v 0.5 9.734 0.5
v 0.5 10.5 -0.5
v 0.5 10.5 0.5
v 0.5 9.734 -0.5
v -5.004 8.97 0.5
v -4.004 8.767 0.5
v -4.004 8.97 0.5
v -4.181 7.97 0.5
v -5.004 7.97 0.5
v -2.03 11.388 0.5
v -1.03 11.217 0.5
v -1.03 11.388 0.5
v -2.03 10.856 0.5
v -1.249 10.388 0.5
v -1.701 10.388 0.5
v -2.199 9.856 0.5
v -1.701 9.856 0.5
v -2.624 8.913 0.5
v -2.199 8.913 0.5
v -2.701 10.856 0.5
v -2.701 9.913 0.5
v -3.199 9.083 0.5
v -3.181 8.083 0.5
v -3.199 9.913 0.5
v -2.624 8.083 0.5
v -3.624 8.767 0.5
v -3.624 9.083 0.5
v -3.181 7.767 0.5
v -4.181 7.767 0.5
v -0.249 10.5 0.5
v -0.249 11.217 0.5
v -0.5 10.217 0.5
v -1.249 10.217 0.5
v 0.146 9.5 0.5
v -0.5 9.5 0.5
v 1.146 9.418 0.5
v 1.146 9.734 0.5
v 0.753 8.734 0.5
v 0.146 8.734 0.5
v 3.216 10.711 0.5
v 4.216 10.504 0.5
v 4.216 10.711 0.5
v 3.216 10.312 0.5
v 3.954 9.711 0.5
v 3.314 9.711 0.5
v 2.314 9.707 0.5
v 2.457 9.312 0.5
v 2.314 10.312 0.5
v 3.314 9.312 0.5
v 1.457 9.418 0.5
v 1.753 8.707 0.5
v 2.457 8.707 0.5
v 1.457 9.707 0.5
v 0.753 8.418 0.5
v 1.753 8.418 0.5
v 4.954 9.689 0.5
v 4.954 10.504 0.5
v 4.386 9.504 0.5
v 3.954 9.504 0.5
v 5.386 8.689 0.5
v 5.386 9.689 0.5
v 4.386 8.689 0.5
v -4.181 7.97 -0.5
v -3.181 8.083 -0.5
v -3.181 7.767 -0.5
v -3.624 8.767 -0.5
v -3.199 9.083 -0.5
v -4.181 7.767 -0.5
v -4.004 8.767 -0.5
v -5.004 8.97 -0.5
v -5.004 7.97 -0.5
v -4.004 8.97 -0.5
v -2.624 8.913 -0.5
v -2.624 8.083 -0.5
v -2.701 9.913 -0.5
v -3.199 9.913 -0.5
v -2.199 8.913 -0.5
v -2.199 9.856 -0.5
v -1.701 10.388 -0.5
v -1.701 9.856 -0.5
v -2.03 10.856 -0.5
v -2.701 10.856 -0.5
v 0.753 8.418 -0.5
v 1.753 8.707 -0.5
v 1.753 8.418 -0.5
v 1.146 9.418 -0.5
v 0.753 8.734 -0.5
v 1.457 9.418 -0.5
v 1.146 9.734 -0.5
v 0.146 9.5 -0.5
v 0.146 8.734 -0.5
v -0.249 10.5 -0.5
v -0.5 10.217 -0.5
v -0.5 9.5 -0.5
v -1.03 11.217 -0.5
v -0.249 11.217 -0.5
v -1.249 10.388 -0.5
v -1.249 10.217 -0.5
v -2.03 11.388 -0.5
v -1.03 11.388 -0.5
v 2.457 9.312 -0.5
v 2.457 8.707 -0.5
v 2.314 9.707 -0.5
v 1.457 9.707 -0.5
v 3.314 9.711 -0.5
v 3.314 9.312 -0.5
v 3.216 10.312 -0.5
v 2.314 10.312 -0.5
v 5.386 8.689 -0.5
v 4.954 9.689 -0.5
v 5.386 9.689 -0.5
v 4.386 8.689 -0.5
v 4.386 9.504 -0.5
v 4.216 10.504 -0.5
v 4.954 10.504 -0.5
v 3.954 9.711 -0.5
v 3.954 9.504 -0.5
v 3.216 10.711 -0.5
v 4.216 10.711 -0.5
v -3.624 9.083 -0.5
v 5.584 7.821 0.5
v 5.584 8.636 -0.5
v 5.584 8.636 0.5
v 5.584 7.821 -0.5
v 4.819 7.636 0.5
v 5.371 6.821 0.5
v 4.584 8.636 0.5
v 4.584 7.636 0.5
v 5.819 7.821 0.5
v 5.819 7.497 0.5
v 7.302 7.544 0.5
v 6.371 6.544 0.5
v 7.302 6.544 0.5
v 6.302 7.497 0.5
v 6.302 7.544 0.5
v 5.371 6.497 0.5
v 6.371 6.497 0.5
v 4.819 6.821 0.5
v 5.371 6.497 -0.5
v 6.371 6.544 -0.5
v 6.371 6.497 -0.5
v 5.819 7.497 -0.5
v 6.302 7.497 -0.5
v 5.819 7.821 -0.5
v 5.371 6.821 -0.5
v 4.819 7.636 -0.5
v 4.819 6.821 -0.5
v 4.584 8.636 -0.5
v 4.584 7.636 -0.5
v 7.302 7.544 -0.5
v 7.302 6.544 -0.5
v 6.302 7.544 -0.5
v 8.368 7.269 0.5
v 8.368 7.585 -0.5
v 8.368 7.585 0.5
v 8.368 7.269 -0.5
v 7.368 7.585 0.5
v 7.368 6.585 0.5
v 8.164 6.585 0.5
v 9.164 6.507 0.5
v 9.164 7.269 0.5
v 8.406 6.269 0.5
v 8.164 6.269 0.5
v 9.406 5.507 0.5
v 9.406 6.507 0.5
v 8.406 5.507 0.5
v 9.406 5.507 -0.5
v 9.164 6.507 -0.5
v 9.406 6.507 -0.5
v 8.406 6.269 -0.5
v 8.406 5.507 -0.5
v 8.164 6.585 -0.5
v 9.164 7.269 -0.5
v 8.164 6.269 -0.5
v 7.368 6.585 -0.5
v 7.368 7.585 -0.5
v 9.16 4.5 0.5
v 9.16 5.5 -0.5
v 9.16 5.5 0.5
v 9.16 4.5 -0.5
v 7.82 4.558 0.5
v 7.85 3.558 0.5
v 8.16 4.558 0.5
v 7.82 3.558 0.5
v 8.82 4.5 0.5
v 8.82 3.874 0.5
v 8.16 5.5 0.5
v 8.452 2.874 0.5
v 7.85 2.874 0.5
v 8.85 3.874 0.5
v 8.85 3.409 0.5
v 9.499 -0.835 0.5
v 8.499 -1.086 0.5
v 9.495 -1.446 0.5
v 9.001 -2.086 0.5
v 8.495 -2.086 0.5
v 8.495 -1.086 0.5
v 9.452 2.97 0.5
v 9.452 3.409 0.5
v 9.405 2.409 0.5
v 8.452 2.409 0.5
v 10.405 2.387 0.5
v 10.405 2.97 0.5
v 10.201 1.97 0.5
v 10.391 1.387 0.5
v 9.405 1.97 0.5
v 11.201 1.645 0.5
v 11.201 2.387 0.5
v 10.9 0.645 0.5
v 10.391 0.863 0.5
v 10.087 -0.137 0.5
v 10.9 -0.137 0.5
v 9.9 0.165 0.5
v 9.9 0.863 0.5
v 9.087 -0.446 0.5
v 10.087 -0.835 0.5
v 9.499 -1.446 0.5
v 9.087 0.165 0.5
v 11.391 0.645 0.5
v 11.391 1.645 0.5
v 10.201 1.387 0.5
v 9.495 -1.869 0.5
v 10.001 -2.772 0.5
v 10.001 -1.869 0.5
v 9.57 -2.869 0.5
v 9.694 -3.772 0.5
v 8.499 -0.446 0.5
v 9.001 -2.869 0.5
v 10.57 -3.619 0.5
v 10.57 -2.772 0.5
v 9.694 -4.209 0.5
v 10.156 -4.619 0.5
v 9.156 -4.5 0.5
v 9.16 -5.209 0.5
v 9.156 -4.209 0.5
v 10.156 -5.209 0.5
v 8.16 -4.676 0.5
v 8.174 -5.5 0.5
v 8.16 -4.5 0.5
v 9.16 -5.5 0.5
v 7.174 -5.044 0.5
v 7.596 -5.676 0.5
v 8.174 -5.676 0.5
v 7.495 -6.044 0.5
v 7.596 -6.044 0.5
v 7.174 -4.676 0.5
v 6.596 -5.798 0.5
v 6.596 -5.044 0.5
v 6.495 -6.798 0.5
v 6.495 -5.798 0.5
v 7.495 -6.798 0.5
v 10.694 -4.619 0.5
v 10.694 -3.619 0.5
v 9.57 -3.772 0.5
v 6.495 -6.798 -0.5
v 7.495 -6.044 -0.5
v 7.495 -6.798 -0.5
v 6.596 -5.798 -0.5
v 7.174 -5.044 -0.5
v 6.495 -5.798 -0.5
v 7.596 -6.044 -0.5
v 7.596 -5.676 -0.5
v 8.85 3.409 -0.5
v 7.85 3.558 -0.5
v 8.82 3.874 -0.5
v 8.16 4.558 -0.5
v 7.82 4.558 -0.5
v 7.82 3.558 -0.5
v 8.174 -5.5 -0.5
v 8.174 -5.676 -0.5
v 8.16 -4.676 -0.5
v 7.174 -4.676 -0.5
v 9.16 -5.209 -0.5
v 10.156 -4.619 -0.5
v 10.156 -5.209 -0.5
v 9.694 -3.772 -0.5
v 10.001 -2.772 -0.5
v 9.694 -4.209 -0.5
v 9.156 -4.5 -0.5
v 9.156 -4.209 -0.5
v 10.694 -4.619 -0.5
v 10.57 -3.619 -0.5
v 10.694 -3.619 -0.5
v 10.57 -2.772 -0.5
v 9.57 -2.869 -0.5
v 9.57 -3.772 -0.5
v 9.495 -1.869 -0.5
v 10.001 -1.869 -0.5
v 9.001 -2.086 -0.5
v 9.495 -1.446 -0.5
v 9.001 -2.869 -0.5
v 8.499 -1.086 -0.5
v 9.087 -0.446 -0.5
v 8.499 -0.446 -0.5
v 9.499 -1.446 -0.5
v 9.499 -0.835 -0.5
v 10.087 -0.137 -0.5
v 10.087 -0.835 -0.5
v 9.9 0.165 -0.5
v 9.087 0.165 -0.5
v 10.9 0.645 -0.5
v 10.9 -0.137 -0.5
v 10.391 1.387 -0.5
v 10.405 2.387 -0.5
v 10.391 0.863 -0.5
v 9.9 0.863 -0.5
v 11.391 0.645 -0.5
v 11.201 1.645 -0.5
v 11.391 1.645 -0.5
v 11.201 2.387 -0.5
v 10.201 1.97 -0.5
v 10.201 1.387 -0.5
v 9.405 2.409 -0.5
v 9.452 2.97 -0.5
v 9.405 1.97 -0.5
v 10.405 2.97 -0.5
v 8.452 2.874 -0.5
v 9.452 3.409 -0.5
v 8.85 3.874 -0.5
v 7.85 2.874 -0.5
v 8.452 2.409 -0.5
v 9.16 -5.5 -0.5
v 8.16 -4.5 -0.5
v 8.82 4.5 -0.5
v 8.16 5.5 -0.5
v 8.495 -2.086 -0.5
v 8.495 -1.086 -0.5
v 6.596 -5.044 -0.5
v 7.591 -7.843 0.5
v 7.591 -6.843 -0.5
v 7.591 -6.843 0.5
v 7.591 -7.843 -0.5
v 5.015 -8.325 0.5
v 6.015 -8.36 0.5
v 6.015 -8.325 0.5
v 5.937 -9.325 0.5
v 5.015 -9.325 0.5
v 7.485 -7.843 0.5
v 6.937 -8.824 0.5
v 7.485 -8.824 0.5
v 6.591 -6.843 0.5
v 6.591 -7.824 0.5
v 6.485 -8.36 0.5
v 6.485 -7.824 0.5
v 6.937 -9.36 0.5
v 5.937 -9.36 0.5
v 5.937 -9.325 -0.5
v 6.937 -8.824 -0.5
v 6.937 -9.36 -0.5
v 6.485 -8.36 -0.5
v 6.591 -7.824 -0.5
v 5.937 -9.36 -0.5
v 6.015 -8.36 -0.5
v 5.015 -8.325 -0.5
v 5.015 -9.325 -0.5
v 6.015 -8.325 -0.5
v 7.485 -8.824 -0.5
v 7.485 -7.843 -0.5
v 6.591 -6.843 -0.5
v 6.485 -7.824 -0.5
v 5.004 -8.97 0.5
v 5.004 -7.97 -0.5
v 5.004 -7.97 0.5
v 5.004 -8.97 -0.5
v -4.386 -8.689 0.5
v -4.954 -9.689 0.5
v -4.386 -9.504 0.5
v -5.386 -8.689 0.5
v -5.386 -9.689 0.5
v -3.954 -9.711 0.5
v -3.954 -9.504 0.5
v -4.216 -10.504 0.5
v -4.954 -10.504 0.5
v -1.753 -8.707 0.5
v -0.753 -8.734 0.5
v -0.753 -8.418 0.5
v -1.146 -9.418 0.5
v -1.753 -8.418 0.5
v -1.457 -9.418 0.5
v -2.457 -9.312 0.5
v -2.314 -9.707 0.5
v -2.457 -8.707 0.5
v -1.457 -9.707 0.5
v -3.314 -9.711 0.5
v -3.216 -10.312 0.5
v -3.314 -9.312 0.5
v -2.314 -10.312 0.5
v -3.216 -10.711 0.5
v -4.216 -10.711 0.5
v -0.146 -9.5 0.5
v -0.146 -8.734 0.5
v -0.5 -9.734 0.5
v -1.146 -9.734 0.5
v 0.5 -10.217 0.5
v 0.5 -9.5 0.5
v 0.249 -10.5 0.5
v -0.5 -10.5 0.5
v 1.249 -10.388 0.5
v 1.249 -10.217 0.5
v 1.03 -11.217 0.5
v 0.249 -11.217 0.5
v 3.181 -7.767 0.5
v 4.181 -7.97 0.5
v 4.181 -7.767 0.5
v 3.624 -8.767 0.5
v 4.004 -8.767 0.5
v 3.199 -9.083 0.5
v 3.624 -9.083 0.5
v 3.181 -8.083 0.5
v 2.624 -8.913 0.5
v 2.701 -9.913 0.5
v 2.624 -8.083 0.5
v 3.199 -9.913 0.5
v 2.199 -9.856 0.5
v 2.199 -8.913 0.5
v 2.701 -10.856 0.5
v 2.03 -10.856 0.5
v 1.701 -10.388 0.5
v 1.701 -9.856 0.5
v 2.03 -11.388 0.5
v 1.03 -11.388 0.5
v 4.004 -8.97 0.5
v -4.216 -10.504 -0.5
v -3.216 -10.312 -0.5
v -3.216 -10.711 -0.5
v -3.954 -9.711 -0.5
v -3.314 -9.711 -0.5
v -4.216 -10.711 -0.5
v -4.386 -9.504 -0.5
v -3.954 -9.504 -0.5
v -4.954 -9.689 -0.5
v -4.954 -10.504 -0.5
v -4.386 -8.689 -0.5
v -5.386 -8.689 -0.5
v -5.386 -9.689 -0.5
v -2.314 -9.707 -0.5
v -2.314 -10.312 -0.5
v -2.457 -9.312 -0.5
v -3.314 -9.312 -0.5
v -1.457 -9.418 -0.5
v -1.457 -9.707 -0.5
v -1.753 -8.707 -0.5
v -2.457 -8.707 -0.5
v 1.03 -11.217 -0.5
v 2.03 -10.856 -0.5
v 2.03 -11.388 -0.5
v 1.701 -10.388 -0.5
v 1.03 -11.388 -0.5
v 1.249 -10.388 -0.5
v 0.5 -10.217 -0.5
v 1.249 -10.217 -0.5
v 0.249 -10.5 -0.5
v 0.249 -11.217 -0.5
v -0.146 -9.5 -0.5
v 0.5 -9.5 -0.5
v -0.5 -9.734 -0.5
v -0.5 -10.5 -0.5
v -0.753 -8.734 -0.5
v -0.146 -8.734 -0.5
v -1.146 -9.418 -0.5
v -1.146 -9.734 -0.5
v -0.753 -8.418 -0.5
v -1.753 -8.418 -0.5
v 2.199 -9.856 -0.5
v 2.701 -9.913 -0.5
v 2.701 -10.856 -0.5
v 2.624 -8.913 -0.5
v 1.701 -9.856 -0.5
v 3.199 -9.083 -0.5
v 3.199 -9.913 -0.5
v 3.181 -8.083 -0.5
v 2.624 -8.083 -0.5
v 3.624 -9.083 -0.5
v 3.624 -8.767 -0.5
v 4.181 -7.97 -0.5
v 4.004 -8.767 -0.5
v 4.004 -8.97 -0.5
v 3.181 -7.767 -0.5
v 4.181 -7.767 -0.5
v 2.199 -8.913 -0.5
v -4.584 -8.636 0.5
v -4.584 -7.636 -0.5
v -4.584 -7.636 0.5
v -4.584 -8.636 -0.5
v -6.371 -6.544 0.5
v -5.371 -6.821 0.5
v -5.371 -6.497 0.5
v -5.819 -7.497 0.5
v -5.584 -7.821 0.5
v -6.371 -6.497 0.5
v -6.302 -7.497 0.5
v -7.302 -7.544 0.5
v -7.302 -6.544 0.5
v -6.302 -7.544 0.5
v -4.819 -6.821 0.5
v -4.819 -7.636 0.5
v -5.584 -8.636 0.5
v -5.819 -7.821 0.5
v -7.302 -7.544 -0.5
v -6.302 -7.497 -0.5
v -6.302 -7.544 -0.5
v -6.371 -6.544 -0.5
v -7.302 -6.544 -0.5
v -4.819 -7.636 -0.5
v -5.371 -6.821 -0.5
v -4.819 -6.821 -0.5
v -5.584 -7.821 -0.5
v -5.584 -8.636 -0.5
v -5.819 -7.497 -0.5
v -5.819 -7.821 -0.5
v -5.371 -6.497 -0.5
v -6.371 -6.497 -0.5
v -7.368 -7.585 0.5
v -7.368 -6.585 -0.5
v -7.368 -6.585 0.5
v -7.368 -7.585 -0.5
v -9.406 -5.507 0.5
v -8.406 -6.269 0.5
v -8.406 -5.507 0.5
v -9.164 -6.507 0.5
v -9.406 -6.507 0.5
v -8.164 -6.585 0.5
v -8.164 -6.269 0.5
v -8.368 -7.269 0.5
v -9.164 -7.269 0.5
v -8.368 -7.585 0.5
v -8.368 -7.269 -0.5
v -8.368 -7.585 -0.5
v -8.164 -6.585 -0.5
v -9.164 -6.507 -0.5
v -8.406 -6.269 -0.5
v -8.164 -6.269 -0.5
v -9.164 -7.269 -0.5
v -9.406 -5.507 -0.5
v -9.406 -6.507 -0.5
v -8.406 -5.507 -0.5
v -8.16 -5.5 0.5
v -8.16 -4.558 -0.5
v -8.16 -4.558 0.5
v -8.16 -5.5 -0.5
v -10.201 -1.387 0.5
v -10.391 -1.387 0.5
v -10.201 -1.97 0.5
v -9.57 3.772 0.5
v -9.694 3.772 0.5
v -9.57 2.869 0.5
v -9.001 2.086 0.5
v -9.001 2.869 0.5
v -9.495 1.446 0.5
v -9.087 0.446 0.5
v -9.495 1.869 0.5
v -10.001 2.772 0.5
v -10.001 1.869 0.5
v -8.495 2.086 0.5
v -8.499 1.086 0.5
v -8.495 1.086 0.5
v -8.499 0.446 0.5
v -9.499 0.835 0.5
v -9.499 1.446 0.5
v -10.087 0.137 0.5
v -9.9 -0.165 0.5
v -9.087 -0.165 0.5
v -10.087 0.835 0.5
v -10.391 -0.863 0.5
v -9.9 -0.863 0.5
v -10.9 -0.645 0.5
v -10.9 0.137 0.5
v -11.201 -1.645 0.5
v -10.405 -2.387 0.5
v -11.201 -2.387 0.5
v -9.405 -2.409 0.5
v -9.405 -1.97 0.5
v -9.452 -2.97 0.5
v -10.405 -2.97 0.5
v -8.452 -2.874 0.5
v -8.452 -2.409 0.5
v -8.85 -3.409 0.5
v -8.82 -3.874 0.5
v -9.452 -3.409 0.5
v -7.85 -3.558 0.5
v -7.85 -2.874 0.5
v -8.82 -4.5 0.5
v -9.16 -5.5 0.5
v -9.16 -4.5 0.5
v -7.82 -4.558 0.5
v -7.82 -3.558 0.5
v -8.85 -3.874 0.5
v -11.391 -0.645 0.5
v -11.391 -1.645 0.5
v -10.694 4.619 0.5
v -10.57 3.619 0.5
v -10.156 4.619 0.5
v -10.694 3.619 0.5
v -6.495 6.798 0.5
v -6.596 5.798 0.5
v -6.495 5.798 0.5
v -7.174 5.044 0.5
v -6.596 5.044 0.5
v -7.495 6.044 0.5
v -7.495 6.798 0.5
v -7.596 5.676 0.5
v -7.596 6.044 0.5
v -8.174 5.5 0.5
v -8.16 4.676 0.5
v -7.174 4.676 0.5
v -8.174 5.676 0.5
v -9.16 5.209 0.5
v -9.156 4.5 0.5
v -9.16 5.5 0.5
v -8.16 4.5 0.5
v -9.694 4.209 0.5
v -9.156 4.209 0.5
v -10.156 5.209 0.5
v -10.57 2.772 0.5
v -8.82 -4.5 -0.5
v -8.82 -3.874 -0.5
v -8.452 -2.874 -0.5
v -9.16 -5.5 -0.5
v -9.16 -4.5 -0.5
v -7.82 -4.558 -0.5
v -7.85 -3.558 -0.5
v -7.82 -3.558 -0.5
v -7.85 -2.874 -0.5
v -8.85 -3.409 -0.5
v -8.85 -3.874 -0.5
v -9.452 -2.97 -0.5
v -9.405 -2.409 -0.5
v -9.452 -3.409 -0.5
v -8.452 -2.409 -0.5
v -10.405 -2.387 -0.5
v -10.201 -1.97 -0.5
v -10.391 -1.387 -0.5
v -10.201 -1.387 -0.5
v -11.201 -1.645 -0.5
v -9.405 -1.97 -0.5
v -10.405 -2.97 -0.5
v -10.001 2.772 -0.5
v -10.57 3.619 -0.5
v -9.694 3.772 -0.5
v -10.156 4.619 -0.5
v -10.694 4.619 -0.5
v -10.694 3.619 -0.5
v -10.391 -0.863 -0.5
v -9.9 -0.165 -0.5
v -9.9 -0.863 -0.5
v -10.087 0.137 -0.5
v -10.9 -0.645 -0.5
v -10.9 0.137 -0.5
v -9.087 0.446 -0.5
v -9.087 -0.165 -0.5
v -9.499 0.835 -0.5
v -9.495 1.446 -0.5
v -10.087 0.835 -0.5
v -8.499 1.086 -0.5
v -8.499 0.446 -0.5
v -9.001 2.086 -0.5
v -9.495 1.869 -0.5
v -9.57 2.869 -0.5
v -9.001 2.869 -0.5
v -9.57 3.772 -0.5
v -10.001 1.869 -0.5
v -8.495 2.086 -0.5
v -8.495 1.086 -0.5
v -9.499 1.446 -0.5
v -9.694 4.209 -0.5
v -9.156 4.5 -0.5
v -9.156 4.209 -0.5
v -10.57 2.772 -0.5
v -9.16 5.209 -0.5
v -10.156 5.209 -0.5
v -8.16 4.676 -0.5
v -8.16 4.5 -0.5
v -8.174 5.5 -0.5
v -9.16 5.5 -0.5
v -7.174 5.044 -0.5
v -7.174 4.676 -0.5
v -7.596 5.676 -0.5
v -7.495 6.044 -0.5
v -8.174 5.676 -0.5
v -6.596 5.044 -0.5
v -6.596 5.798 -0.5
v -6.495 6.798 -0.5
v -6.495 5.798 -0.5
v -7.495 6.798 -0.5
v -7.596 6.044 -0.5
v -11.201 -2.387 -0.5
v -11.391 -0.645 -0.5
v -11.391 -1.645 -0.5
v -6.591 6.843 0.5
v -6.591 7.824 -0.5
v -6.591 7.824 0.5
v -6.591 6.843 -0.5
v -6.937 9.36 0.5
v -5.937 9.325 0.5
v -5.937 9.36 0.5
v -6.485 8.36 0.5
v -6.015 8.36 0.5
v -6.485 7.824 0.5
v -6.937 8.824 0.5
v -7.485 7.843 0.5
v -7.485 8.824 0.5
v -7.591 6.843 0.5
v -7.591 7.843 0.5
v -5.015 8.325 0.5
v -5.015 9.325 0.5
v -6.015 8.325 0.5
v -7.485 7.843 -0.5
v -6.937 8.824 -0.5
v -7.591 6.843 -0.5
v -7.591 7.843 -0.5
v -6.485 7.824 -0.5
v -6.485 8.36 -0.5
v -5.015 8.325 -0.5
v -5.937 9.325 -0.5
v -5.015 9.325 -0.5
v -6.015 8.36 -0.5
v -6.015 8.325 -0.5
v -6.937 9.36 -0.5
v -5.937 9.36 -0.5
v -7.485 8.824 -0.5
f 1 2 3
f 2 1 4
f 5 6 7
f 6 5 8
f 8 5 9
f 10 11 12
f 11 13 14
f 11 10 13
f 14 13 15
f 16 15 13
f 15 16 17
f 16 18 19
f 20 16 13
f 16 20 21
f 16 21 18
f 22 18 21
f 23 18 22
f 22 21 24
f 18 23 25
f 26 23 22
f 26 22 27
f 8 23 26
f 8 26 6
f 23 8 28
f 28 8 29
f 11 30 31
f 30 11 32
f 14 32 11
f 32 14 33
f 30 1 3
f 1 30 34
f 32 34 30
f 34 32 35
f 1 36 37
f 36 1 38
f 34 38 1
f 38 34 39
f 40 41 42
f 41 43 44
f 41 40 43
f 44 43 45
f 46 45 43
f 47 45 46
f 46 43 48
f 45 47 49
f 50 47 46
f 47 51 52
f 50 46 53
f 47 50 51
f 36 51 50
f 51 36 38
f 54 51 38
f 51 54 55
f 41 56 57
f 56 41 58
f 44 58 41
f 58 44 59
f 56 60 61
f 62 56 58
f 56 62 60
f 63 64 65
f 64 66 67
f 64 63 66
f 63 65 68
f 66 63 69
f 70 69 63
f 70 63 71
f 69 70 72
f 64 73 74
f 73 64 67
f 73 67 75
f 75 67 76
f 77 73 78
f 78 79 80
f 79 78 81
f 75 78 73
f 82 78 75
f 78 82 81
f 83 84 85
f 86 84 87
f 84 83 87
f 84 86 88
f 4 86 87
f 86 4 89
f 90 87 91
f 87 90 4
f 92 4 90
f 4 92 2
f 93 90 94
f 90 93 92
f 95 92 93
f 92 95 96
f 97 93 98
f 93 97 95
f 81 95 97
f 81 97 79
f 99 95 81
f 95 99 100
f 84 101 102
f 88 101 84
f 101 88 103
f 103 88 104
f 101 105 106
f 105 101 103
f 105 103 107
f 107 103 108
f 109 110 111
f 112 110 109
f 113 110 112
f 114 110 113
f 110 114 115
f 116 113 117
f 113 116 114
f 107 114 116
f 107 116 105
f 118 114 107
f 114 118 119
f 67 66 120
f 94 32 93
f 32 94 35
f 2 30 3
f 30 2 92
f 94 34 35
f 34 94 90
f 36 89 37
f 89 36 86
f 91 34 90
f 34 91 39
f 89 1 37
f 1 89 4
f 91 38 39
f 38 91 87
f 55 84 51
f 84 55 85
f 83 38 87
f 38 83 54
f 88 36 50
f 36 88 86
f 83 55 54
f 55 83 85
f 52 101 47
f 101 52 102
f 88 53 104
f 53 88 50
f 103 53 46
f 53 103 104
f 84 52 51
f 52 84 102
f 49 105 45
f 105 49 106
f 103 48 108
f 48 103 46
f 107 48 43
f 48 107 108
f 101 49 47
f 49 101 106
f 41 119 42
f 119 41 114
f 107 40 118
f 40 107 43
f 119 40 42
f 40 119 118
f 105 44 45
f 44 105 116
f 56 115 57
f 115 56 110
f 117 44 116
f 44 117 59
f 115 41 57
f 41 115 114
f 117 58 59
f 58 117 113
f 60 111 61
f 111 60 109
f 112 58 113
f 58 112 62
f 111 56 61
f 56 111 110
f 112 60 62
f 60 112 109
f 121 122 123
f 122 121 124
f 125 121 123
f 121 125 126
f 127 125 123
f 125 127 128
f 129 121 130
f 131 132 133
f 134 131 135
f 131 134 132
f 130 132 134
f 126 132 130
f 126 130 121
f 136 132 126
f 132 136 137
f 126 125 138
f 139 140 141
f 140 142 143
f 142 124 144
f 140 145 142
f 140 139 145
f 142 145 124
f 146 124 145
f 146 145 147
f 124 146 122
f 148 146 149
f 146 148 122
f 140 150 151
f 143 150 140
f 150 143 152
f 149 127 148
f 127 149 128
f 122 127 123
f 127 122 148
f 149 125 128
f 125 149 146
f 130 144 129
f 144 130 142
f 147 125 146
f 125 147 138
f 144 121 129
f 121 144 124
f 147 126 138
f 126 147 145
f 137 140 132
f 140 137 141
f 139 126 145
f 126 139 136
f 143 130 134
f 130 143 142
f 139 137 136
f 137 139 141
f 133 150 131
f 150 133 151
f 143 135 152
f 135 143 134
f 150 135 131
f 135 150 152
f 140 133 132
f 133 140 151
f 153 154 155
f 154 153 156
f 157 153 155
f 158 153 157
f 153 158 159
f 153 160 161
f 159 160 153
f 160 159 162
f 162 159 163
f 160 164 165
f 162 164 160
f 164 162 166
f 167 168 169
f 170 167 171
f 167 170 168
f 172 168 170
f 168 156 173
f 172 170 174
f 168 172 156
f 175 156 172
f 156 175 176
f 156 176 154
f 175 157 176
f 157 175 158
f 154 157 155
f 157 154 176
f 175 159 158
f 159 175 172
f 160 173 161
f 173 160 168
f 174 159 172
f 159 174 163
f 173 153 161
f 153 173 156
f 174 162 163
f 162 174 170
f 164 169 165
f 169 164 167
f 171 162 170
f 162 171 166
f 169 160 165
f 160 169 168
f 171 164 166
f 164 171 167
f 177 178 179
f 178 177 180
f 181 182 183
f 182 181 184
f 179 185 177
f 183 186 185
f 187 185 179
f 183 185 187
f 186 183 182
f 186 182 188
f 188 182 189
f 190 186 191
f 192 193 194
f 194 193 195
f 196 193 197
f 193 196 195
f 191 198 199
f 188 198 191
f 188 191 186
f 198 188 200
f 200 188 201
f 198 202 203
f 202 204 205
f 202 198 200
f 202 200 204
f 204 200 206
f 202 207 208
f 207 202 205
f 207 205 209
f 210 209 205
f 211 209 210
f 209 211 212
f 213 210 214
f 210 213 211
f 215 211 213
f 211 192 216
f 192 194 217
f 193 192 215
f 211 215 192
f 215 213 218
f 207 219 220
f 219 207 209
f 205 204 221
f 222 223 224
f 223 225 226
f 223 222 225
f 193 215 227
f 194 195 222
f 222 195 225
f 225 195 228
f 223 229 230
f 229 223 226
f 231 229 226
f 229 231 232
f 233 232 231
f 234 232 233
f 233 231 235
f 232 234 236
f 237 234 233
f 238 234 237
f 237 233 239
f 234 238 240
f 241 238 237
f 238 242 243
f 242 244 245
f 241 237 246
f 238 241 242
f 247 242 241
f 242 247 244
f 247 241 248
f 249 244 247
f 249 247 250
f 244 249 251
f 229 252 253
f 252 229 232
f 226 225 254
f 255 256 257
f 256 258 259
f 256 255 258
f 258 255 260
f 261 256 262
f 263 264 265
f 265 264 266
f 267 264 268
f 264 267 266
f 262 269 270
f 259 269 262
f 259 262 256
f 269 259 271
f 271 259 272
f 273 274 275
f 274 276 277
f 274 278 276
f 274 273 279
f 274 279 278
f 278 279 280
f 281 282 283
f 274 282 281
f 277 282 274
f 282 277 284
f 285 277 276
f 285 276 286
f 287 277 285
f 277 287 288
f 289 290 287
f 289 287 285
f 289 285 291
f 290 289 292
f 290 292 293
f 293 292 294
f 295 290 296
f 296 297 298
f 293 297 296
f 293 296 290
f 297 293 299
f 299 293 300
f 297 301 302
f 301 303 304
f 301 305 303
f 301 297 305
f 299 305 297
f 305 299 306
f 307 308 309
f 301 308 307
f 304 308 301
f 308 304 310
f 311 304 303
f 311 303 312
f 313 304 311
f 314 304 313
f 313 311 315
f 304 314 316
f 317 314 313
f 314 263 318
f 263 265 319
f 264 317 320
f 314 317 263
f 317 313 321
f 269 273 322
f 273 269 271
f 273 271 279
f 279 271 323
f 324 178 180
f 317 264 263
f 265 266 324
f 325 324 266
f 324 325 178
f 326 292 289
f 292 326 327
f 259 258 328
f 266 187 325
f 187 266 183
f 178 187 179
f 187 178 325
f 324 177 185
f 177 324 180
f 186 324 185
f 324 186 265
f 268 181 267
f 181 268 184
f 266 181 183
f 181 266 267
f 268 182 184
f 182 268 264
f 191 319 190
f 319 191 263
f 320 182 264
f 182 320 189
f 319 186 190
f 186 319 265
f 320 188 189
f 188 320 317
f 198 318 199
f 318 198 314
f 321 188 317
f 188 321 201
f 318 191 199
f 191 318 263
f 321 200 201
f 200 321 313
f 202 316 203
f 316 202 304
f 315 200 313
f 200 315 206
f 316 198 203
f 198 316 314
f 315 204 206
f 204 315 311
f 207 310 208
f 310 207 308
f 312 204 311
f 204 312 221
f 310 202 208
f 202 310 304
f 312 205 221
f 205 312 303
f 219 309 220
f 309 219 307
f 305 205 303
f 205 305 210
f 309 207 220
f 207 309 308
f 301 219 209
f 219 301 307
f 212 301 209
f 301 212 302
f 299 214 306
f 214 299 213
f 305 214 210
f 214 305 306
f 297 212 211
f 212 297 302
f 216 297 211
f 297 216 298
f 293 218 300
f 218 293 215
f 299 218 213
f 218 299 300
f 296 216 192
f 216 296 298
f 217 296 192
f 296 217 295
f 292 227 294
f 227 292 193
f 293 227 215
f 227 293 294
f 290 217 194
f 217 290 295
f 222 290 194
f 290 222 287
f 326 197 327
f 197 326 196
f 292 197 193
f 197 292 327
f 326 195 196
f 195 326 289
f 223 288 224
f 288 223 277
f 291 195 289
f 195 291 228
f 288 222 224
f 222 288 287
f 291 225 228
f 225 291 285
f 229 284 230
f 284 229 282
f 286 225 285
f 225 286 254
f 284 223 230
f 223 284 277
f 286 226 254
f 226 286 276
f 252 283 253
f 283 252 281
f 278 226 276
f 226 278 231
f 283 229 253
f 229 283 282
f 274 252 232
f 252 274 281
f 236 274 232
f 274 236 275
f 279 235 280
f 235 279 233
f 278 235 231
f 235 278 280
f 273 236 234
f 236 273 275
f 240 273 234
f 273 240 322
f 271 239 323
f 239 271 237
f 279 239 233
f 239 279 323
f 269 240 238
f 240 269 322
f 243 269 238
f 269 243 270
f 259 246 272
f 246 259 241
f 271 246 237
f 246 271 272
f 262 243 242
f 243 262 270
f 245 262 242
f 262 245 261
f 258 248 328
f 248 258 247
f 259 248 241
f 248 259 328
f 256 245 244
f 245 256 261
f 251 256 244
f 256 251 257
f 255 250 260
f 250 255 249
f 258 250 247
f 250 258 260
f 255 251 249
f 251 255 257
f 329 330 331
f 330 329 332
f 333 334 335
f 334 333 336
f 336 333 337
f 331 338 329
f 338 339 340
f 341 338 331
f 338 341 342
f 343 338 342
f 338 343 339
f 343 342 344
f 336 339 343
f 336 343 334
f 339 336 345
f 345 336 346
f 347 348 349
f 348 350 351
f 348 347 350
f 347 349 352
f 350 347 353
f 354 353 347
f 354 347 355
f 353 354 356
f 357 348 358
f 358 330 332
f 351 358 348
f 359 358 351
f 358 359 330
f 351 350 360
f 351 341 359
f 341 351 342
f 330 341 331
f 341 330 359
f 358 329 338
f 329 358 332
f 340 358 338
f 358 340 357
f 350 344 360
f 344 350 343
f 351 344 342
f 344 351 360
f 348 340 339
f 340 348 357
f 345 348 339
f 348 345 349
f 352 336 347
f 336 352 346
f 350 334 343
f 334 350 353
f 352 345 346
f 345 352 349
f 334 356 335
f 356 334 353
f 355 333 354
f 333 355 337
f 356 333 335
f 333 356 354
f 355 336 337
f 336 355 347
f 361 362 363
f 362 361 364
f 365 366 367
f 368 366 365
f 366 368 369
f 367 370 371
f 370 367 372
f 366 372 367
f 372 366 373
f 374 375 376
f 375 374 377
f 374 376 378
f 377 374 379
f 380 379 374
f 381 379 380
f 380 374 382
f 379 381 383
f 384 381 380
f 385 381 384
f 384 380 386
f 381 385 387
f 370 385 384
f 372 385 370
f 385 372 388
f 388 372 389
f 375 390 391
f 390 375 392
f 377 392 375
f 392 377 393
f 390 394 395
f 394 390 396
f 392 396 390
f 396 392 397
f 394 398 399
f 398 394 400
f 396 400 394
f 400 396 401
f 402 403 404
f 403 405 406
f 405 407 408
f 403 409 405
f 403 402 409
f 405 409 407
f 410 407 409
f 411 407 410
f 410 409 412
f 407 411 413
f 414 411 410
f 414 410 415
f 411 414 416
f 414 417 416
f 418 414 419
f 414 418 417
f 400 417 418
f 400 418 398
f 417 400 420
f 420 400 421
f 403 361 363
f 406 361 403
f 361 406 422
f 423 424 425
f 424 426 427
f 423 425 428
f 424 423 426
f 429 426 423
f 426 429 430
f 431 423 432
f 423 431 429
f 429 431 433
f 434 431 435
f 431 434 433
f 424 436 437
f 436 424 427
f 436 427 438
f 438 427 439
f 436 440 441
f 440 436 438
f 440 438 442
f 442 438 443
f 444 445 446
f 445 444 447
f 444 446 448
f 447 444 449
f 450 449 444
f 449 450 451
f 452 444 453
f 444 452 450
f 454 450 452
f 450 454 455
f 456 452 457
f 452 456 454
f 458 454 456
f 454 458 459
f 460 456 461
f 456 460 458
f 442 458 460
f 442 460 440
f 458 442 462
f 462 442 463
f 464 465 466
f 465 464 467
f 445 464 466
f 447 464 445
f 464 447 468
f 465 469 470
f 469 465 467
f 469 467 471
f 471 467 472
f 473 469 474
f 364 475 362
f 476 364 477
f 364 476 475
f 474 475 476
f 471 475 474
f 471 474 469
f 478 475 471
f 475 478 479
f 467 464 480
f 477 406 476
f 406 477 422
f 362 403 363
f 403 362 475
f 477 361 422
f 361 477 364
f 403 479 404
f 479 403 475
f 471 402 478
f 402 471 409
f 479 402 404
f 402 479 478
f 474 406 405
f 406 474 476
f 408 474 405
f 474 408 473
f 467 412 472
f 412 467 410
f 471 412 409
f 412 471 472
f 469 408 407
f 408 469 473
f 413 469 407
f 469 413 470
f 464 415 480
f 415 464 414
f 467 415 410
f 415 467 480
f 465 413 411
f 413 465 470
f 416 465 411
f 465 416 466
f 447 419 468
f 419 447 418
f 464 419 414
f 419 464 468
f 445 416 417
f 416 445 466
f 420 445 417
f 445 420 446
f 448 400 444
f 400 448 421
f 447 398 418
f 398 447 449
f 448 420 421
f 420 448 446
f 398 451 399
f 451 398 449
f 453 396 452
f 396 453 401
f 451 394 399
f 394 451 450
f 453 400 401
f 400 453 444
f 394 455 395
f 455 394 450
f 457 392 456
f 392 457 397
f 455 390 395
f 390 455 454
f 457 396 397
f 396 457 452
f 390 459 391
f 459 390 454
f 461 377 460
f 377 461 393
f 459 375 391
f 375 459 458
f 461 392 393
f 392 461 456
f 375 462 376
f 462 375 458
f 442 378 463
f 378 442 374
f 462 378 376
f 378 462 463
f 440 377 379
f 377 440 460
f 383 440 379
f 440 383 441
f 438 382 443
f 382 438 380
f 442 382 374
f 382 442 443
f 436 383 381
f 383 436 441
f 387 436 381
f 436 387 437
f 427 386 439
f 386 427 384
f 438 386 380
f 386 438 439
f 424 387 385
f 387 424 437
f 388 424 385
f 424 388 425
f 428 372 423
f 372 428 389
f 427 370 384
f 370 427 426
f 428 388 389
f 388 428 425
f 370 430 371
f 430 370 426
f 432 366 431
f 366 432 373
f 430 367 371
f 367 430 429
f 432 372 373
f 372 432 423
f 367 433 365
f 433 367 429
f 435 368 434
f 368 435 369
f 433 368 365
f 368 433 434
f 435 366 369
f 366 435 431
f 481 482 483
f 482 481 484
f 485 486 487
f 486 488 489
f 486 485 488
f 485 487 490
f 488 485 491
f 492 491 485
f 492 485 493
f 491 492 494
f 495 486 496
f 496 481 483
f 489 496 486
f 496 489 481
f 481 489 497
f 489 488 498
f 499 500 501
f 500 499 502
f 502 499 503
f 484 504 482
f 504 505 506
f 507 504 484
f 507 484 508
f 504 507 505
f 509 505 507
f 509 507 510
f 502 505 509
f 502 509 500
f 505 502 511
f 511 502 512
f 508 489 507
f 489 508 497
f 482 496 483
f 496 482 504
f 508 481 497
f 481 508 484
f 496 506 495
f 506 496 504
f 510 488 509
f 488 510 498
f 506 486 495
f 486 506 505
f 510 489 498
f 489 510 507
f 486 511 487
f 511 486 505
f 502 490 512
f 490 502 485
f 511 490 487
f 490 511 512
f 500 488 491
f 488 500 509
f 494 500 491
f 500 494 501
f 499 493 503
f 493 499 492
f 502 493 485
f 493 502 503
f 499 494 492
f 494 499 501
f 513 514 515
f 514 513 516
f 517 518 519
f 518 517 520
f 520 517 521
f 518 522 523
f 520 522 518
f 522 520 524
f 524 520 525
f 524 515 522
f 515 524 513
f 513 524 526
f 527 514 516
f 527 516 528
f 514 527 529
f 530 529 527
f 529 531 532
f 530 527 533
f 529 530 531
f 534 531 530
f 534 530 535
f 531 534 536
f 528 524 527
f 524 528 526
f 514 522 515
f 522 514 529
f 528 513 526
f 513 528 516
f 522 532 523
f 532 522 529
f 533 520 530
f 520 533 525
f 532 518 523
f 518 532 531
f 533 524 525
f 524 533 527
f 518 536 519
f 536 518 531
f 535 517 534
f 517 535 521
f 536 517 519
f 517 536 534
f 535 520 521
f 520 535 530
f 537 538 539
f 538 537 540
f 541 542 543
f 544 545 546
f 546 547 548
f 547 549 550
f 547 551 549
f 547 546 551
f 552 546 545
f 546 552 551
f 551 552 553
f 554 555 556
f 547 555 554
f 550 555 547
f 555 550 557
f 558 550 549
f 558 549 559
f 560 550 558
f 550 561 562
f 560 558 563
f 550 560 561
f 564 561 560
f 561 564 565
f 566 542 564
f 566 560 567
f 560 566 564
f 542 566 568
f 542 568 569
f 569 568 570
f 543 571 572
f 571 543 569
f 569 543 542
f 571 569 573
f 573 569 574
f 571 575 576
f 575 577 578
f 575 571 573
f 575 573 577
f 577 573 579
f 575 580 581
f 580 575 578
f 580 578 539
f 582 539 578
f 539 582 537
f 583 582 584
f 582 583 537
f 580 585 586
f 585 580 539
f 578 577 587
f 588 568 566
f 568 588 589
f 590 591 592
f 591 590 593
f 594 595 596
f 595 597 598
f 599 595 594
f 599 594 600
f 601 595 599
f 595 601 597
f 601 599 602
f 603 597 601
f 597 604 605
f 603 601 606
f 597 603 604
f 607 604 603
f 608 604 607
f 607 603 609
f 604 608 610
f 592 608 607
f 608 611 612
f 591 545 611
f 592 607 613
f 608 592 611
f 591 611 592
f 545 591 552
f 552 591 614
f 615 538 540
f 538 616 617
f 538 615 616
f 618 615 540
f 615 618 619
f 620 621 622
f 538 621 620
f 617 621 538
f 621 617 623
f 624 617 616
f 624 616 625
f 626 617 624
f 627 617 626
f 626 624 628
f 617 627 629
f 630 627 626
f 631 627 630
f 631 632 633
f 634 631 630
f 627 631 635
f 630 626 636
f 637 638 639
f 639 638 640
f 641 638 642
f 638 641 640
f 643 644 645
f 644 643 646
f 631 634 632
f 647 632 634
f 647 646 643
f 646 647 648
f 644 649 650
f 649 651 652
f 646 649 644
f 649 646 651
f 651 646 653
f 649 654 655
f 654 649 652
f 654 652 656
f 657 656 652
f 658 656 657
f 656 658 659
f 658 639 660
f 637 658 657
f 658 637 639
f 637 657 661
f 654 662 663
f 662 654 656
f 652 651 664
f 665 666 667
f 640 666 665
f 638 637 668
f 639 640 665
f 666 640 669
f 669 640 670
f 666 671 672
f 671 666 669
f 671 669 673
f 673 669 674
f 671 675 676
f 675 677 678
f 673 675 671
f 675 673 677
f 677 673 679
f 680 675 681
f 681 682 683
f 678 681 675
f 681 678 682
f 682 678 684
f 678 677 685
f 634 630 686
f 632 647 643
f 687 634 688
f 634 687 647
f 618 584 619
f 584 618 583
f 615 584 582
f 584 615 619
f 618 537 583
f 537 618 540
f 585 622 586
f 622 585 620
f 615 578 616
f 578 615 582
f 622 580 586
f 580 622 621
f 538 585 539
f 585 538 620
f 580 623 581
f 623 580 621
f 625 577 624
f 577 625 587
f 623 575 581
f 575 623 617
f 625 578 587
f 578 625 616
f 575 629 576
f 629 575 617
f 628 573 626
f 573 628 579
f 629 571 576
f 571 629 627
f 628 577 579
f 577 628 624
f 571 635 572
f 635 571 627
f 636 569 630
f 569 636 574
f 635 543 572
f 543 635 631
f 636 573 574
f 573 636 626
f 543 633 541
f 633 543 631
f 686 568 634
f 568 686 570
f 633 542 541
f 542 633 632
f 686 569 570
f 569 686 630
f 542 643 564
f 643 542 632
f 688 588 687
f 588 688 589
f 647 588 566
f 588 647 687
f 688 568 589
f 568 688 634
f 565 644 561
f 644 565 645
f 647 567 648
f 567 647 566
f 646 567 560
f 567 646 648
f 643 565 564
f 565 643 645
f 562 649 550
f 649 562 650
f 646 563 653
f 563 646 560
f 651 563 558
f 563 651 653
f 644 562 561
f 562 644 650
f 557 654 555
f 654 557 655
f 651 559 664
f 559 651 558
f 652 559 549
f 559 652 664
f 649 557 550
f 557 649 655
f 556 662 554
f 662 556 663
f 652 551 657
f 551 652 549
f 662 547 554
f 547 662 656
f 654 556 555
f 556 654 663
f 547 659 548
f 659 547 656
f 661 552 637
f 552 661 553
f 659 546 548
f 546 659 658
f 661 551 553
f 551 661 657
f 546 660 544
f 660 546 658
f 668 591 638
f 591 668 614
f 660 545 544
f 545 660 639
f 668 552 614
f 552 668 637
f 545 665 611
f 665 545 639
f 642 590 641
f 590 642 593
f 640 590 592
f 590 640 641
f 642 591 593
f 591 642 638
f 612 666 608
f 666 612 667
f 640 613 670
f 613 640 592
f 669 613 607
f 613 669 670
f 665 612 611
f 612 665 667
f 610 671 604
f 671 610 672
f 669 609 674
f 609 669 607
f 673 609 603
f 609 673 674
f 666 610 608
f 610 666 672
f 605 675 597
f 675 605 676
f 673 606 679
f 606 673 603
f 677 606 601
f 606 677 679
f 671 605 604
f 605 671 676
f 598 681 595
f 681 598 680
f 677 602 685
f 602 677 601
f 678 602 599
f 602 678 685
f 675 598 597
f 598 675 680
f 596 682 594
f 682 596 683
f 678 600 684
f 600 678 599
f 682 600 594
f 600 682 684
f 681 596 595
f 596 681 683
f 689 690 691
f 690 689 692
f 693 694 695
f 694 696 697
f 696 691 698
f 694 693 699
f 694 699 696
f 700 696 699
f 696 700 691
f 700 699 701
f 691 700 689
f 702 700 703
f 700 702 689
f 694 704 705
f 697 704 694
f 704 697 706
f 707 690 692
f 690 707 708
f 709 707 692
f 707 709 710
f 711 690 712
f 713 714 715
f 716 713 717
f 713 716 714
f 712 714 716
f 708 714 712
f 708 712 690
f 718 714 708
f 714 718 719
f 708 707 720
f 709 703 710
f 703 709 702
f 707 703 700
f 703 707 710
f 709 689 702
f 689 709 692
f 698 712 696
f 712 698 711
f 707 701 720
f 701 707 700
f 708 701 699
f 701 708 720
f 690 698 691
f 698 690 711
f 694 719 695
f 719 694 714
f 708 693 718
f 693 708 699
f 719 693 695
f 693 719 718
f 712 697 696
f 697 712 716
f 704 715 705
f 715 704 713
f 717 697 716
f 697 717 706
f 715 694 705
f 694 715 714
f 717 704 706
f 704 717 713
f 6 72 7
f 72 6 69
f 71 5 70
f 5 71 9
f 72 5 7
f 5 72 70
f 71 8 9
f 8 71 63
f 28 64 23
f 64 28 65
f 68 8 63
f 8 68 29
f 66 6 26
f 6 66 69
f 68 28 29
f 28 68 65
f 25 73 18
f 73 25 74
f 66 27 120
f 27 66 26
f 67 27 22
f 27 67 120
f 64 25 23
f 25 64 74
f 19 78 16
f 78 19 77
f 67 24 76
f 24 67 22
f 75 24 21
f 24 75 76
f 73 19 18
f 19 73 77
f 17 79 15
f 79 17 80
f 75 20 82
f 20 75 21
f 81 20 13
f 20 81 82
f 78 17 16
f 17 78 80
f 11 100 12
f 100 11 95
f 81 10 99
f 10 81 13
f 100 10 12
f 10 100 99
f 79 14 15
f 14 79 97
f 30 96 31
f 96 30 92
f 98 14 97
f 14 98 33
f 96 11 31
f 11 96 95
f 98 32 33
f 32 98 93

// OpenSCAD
//
//  A wobbly circle made out of cubes
//  Sarah Kelley, 8/26/2020
//

radius = 10;  // [0:20]
wobble = 12;  // [0:50]
step = 4;     // [1:90]
cubeSize = 1.0; // [0.1:10]

function circleFnRecurse(r, wobble, deg, step, prev) =
    ((deg < 0) || (deg >= 360))
    ?  prev
    : let (bar=r-sin(deg*wobble))
        circleFnRecurse(r, wobble, deg+step, step, 
            concat(prev,[[bar*sin(deg),bar*cos(deg)]]));

function circleFn(r, wobble, step) =
    circleFnRecurse(r, wobble, 0, step, []);


circlePoints = circleFn(radius, wobble, step);

for (p = circlePoints) {
    translate([p[0],p[1],0]) {
        cube([cubeSize, cubeSize, 1], center=true);
    }
}
